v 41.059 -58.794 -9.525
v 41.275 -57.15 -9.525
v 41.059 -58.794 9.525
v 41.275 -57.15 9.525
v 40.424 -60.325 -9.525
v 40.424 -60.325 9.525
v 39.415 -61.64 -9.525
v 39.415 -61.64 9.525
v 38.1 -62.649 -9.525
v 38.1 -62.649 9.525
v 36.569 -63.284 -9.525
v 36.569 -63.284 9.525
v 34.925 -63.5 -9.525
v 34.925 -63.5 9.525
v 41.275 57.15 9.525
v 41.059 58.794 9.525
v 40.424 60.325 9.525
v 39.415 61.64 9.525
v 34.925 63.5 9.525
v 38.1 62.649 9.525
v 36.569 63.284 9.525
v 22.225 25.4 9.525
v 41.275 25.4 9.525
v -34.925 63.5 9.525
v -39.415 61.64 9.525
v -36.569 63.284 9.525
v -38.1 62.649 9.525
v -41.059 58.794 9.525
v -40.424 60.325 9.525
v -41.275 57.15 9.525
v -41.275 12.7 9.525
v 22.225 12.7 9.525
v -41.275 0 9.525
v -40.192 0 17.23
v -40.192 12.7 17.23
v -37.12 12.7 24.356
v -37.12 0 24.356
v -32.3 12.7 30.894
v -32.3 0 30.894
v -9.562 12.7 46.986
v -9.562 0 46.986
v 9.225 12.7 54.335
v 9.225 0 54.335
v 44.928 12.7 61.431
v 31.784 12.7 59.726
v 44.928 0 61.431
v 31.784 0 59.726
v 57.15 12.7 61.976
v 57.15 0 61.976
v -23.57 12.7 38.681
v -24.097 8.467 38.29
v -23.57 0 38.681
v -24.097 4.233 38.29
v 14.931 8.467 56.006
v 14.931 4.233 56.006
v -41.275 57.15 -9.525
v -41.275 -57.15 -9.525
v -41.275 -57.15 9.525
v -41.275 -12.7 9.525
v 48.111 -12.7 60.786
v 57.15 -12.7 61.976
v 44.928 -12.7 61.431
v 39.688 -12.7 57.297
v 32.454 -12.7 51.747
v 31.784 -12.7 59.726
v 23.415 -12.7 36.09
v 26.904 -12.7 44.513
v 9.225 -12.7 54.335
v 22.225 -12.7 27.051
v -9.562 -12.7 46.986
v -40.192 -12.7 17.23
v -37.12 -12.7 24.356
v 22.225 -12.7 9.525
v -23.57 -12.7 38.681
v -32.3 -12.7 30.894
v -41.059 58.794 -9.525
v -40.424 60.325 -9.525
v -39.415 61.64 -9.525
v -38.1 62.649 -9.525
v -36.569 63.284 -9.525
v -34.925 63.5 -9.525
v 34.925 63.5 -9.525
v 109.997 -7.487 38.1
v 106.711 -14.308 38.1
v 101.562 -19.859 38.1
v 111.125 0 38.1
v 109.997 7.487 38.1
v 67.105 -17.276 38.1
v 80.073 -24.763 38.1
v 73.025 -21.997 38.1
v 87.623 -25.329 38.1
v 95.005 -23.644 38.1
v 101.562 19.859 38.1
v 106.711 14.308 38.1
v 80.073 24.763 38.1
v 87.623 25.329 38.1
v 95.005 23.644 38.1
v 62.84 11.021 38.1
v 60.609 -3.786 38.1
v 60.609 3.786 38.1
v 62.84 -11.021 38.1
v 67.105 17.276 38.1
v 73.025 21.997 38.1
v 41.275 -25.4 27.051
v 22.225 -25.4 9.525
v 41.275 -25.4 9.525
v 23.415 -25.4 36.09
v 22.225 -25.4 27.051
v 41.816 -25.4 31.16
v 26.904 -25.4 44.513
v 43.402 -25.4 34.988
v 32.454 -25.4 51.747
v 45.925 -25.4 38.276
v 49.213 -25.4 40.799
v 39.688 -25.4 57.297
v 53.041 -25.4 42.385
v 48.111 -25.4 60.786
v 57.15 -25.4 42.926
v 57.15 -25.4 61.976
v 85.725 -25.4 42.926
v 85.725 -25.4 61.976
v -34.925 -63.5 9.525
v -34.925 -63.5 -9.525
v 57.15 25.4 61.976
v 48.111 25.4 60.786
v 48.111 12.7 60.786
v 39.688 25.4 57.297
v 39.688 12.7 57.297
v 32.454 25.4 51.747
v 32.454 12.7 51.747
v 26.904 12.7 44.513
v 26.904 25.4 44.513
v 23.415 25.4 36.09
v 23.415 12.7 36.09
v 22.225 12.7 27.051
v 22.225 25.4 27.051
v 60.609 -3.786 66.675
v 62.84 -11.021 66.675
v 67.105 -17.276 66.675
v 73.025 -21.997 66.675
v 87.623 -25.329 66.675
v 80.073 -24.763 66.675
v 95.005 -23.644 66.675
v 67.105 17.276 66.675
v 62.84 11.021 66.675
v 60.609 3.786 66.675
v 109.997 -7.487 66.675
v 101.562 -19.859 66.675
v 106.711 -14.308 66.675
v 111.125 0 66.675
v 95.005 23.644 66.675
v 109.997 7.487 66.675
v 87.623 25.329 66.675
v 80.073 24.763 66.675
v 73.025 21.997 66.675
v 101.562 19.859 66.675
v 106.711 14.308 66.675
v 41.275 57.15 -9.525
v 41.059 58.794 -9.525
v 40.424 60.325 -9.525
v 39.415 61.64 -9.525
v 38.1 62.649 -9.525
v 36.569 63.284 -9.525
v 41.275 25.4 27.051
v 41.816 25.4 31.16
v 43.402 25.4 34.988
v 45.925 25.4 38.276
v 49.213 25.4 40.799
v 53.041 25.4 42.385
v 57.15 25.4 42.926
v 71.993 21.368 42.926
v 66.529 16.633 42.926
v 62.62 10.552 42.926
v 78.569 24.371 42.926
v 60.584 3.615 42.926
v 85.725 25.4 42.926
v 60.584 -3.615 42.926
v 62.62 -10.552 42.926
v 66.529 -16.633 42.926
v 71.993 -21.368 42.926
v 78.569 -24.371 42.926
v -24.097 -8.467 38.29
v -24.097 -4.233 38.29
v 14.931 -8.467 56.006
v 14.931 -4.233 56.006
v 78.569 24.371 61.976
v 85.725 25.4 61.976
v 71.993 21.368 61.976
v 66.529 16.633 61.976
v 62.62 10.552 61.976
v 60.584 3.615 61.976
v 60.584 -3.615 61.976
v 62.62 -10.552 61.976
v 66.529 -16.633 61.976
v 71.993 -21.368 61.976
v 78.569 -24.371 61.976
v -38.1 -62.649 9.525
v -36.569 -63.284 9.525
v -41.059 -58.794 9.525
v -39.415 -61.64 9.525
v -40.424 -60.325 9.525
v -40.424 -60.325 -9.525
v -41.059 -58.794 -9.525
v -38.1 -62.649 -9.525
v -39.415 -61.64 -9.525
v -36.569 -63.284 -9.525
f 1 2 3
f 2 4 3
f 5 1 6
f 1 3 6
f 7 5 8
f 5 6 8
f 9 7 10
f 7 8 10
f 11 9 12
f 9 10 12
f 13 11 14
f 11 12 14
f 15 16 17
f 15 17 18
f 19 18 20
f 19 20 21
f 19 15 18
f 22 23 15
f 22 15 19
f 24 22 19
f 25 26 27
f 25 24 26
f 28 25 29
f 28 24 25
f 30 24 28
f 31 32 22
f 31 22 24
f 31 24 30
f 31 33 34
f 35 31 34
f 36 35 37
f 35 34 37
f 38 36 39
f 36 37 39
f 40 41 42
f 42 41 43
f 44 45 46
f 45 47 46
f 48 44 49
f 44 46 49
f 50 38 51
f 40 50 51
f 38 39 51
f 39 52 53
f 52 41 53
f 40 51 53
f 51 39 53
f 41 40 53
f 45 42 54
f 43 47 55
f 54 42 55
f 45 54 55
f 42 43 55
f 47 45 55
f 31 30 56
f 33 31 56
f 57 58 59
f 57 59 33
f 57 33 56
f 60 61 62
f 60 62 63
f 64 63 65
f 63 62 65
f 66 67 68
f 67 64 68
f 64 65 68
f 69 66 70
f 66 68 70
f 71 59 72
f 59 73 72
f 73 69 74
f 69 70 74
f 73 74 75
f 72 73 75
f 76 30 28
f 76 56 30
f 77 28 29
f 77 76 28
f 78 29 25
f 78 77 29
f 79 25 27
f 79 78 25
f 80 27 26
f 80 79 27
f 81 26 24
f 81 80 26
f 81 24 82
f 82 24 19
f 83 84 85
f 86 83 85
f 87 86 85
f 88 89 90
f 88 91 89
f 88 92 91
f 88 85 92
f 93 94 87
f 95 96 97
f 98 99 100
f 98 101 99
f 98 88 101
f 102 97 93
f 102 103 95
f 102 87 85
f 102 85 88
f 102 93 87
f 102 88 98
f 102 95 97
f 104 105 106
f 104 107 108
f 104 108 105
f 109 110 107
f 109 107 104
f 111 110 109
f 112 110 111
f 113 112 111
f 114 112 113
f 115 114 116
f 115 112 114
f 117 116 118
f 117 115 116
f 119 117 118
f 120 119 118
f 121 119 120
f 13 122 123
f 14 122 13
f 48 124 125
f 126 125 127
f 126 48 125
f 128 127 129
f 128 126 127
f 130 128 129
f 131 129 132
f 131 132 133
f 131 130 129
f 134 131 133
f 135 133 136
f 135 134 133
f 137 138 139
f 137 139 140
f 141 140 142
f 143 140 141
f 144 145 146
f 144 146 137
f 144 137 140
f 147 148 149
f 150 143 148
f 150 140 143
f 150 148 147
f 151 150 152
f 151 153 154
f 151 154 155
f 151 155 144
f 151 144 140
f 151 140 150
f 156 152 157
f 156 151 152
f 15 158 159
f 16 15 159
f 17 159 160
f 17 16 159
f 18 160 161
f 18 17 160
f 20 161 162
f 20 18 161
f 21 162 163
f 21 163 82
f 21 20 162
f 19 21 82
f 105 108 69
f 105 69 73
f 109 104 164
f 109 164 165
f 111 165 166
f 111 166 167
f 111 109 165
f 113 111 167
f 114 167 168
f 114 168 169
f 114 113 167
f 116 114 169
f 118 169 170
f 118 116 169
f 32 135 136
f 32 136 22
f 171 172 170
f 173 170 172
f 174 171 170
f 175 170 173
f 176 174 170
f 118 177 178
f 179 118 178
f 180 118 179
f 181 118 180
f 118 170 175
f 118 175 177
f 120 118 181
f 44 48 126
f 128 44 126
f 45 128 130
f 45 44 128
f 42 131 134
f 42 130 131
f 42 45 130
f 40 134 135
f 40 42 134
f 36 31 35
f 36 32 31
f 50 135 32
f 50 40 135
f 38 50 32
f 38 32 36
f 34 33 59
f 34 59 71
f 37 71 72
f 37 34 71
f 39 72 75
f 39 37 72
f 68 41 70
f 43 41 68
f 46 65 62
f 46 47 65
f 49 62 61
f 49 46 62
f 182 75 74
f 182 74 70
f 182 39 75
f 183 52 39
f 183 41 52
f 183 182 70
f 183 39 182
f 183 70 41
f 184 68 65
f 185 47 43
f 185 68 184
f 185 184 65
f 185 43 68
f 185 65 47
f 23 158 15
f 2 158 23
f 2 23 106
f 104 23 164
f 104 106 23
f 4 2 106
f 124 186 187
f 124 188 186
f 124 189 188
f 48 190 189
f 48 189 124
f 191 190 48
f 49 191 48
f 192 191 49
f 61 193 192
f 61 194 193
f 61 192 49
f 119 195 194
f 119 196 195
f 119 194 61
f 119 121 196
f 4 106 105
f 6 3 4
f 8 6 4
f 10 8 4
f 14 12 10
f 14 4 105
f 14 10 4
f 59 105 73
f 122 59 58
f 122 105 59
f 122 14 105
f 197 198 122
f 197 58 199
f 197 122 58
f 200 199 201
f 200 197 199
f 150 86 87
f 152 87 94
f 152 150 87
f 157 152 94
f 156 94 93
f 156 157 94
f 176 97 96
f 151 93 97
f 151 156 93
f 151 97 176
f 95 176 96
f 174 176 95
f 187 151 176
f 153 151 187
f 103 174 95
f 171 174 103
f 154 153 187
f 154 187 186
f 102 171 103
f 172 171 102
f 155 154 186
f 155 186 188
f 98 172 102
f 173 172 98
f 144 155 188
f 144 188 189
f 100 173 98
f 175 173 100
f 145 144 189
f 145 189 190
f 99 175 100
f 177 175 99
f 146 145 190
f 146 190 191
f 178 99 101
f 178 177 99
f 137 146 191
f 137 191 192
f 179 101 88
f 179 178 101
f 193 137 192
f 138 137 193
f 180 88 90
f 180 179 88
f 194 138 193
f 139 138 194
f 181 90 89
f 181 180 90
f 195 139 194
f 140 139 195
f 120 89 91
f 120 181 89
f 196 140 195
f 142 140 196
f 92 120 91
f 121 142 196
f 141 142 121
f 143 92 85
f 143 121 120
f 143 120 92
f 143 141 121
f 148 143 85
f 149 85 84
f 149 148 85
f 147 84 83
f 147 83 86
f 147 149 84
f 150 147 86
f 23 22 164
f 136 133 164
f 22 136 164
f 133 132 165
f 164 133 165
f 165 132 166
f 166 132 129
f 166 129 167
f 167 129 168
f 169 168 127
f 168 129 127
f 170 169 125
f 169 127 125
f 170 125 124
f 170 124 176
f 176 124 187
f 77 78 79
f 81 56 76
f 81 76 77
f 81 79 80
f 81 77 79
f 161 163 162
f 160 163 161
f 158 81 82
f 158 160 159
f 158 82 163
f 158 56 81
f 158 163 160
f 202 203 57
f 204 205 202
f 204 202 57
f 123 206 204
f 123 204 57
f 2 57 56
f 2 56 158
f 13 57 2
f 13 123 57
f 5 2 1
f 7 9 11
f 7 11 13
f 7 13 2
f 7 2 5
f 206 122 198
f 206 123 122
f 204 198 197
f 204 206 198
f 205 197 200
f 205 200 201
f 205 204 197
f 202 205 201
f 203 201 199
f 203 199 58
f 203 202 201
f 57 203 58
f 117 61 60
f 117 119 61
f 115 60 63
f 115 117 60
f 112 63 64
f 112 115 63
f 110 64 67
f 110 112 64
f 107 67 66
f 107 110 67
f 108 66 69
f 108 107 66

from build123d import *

# Parameters (mm, degrees)
F1_DEPTH = 63.5
F2_DEPTH = 25.4
F3_DEPTH = 12.7
F5_R     = 6.35


with BuildPart() as f1:
    # F0 (on Front) → F1 (new body, symmetric)
    with BuildSketch(Plane.XZ):
        Polygon((-41.275, 9.525), (-41.275, -9.525), (41.275, -9.525), (41.275, 9.525), (22.225, 9.525), align=None)
    extrude(amount=F1_DEPTH, both=True)

    # F0 (on Front) → F2 (join, symmetric)
    with BuildSketch(Plane.XZ):
        with BuildLine():
            Line((22.225, 9.525), (41.275, 9.525))
            Line((41.275, 9.525), (41.275, 27.051))
            ThreePointArc((41.275, 27.051), (45.9246798487, 38.2763201513), (57.15, 42.926))
            Line((57.15, 42.926), (60.325, 42.926))
            Line((60.325, 42.926), (60.325, 61.976))
            Line((60.325, 61.976), (57.15, 61.976))
            ThreePointArc((57.15, 61.976), (32.4542956671, 51.7467043329), (22.225, 27.051))
            Line((22.225, 27.051), (22.225, 9.525))
        make_face()
        Polygon((82.0737038128, 61.976), (60.325, 61.976), (60.325, 42.926), (82.0737038128, 42.926), (85.725, 42.926), (85.725, 61.976), align=None)
    extrude(amount=F2_DEPTH, both=True)

    # F0 (on Front) → F3 (join, symmetric)
    with BuildSketch(Plane.XZ):
        with BuildLine():
            add(Edge.make_bspline(
                [(-41.275, 9.525), (-41.2416942418, 43.5823909938), (19.5547696203, 62.110837549), (57.15, 61.976)],
                knots=[0, 0, 0, 0, 111.5284180198, 111.5284180198, 111.5284180198, 111.5284180198], degree=3))
            Line((-41.275, 9.525), (22.225, 9.525))
            Line((22.225, 9.525), (22.225, 27.051))
            ThreePointArc((22.225, 27.051), (32.4542956671, 51.7467043329), (57.15, 61.976))
        make_face()
    extrude(amount=F3_DEPTH, both=True)

    # F0 (on Front) → F4 (revolve)
    with BuildSketch(Plane.XZ):
        Polygon((111.125, 66.675), (85.725, 66.675), (85.725, 61.976), (85.725, 42.926), (85.725, 38.1), (111.125, 38.1), align=None)
    revolve(axis=Axis((85.725, 0, 52.3875), (0, 0, 1)))

    # F5
    f5_edges = [f1.edges().sort_by_distance(p)[0] for p in [
        (-41.275, -63.5, 0),
        (41.275, -63.5, 0),
        (41.275, 63.5, 0),
        (-41.275, 63.5, 0),
    ]]
    fillet(f5_edges, radius=F5_R)


solid = f1.part
